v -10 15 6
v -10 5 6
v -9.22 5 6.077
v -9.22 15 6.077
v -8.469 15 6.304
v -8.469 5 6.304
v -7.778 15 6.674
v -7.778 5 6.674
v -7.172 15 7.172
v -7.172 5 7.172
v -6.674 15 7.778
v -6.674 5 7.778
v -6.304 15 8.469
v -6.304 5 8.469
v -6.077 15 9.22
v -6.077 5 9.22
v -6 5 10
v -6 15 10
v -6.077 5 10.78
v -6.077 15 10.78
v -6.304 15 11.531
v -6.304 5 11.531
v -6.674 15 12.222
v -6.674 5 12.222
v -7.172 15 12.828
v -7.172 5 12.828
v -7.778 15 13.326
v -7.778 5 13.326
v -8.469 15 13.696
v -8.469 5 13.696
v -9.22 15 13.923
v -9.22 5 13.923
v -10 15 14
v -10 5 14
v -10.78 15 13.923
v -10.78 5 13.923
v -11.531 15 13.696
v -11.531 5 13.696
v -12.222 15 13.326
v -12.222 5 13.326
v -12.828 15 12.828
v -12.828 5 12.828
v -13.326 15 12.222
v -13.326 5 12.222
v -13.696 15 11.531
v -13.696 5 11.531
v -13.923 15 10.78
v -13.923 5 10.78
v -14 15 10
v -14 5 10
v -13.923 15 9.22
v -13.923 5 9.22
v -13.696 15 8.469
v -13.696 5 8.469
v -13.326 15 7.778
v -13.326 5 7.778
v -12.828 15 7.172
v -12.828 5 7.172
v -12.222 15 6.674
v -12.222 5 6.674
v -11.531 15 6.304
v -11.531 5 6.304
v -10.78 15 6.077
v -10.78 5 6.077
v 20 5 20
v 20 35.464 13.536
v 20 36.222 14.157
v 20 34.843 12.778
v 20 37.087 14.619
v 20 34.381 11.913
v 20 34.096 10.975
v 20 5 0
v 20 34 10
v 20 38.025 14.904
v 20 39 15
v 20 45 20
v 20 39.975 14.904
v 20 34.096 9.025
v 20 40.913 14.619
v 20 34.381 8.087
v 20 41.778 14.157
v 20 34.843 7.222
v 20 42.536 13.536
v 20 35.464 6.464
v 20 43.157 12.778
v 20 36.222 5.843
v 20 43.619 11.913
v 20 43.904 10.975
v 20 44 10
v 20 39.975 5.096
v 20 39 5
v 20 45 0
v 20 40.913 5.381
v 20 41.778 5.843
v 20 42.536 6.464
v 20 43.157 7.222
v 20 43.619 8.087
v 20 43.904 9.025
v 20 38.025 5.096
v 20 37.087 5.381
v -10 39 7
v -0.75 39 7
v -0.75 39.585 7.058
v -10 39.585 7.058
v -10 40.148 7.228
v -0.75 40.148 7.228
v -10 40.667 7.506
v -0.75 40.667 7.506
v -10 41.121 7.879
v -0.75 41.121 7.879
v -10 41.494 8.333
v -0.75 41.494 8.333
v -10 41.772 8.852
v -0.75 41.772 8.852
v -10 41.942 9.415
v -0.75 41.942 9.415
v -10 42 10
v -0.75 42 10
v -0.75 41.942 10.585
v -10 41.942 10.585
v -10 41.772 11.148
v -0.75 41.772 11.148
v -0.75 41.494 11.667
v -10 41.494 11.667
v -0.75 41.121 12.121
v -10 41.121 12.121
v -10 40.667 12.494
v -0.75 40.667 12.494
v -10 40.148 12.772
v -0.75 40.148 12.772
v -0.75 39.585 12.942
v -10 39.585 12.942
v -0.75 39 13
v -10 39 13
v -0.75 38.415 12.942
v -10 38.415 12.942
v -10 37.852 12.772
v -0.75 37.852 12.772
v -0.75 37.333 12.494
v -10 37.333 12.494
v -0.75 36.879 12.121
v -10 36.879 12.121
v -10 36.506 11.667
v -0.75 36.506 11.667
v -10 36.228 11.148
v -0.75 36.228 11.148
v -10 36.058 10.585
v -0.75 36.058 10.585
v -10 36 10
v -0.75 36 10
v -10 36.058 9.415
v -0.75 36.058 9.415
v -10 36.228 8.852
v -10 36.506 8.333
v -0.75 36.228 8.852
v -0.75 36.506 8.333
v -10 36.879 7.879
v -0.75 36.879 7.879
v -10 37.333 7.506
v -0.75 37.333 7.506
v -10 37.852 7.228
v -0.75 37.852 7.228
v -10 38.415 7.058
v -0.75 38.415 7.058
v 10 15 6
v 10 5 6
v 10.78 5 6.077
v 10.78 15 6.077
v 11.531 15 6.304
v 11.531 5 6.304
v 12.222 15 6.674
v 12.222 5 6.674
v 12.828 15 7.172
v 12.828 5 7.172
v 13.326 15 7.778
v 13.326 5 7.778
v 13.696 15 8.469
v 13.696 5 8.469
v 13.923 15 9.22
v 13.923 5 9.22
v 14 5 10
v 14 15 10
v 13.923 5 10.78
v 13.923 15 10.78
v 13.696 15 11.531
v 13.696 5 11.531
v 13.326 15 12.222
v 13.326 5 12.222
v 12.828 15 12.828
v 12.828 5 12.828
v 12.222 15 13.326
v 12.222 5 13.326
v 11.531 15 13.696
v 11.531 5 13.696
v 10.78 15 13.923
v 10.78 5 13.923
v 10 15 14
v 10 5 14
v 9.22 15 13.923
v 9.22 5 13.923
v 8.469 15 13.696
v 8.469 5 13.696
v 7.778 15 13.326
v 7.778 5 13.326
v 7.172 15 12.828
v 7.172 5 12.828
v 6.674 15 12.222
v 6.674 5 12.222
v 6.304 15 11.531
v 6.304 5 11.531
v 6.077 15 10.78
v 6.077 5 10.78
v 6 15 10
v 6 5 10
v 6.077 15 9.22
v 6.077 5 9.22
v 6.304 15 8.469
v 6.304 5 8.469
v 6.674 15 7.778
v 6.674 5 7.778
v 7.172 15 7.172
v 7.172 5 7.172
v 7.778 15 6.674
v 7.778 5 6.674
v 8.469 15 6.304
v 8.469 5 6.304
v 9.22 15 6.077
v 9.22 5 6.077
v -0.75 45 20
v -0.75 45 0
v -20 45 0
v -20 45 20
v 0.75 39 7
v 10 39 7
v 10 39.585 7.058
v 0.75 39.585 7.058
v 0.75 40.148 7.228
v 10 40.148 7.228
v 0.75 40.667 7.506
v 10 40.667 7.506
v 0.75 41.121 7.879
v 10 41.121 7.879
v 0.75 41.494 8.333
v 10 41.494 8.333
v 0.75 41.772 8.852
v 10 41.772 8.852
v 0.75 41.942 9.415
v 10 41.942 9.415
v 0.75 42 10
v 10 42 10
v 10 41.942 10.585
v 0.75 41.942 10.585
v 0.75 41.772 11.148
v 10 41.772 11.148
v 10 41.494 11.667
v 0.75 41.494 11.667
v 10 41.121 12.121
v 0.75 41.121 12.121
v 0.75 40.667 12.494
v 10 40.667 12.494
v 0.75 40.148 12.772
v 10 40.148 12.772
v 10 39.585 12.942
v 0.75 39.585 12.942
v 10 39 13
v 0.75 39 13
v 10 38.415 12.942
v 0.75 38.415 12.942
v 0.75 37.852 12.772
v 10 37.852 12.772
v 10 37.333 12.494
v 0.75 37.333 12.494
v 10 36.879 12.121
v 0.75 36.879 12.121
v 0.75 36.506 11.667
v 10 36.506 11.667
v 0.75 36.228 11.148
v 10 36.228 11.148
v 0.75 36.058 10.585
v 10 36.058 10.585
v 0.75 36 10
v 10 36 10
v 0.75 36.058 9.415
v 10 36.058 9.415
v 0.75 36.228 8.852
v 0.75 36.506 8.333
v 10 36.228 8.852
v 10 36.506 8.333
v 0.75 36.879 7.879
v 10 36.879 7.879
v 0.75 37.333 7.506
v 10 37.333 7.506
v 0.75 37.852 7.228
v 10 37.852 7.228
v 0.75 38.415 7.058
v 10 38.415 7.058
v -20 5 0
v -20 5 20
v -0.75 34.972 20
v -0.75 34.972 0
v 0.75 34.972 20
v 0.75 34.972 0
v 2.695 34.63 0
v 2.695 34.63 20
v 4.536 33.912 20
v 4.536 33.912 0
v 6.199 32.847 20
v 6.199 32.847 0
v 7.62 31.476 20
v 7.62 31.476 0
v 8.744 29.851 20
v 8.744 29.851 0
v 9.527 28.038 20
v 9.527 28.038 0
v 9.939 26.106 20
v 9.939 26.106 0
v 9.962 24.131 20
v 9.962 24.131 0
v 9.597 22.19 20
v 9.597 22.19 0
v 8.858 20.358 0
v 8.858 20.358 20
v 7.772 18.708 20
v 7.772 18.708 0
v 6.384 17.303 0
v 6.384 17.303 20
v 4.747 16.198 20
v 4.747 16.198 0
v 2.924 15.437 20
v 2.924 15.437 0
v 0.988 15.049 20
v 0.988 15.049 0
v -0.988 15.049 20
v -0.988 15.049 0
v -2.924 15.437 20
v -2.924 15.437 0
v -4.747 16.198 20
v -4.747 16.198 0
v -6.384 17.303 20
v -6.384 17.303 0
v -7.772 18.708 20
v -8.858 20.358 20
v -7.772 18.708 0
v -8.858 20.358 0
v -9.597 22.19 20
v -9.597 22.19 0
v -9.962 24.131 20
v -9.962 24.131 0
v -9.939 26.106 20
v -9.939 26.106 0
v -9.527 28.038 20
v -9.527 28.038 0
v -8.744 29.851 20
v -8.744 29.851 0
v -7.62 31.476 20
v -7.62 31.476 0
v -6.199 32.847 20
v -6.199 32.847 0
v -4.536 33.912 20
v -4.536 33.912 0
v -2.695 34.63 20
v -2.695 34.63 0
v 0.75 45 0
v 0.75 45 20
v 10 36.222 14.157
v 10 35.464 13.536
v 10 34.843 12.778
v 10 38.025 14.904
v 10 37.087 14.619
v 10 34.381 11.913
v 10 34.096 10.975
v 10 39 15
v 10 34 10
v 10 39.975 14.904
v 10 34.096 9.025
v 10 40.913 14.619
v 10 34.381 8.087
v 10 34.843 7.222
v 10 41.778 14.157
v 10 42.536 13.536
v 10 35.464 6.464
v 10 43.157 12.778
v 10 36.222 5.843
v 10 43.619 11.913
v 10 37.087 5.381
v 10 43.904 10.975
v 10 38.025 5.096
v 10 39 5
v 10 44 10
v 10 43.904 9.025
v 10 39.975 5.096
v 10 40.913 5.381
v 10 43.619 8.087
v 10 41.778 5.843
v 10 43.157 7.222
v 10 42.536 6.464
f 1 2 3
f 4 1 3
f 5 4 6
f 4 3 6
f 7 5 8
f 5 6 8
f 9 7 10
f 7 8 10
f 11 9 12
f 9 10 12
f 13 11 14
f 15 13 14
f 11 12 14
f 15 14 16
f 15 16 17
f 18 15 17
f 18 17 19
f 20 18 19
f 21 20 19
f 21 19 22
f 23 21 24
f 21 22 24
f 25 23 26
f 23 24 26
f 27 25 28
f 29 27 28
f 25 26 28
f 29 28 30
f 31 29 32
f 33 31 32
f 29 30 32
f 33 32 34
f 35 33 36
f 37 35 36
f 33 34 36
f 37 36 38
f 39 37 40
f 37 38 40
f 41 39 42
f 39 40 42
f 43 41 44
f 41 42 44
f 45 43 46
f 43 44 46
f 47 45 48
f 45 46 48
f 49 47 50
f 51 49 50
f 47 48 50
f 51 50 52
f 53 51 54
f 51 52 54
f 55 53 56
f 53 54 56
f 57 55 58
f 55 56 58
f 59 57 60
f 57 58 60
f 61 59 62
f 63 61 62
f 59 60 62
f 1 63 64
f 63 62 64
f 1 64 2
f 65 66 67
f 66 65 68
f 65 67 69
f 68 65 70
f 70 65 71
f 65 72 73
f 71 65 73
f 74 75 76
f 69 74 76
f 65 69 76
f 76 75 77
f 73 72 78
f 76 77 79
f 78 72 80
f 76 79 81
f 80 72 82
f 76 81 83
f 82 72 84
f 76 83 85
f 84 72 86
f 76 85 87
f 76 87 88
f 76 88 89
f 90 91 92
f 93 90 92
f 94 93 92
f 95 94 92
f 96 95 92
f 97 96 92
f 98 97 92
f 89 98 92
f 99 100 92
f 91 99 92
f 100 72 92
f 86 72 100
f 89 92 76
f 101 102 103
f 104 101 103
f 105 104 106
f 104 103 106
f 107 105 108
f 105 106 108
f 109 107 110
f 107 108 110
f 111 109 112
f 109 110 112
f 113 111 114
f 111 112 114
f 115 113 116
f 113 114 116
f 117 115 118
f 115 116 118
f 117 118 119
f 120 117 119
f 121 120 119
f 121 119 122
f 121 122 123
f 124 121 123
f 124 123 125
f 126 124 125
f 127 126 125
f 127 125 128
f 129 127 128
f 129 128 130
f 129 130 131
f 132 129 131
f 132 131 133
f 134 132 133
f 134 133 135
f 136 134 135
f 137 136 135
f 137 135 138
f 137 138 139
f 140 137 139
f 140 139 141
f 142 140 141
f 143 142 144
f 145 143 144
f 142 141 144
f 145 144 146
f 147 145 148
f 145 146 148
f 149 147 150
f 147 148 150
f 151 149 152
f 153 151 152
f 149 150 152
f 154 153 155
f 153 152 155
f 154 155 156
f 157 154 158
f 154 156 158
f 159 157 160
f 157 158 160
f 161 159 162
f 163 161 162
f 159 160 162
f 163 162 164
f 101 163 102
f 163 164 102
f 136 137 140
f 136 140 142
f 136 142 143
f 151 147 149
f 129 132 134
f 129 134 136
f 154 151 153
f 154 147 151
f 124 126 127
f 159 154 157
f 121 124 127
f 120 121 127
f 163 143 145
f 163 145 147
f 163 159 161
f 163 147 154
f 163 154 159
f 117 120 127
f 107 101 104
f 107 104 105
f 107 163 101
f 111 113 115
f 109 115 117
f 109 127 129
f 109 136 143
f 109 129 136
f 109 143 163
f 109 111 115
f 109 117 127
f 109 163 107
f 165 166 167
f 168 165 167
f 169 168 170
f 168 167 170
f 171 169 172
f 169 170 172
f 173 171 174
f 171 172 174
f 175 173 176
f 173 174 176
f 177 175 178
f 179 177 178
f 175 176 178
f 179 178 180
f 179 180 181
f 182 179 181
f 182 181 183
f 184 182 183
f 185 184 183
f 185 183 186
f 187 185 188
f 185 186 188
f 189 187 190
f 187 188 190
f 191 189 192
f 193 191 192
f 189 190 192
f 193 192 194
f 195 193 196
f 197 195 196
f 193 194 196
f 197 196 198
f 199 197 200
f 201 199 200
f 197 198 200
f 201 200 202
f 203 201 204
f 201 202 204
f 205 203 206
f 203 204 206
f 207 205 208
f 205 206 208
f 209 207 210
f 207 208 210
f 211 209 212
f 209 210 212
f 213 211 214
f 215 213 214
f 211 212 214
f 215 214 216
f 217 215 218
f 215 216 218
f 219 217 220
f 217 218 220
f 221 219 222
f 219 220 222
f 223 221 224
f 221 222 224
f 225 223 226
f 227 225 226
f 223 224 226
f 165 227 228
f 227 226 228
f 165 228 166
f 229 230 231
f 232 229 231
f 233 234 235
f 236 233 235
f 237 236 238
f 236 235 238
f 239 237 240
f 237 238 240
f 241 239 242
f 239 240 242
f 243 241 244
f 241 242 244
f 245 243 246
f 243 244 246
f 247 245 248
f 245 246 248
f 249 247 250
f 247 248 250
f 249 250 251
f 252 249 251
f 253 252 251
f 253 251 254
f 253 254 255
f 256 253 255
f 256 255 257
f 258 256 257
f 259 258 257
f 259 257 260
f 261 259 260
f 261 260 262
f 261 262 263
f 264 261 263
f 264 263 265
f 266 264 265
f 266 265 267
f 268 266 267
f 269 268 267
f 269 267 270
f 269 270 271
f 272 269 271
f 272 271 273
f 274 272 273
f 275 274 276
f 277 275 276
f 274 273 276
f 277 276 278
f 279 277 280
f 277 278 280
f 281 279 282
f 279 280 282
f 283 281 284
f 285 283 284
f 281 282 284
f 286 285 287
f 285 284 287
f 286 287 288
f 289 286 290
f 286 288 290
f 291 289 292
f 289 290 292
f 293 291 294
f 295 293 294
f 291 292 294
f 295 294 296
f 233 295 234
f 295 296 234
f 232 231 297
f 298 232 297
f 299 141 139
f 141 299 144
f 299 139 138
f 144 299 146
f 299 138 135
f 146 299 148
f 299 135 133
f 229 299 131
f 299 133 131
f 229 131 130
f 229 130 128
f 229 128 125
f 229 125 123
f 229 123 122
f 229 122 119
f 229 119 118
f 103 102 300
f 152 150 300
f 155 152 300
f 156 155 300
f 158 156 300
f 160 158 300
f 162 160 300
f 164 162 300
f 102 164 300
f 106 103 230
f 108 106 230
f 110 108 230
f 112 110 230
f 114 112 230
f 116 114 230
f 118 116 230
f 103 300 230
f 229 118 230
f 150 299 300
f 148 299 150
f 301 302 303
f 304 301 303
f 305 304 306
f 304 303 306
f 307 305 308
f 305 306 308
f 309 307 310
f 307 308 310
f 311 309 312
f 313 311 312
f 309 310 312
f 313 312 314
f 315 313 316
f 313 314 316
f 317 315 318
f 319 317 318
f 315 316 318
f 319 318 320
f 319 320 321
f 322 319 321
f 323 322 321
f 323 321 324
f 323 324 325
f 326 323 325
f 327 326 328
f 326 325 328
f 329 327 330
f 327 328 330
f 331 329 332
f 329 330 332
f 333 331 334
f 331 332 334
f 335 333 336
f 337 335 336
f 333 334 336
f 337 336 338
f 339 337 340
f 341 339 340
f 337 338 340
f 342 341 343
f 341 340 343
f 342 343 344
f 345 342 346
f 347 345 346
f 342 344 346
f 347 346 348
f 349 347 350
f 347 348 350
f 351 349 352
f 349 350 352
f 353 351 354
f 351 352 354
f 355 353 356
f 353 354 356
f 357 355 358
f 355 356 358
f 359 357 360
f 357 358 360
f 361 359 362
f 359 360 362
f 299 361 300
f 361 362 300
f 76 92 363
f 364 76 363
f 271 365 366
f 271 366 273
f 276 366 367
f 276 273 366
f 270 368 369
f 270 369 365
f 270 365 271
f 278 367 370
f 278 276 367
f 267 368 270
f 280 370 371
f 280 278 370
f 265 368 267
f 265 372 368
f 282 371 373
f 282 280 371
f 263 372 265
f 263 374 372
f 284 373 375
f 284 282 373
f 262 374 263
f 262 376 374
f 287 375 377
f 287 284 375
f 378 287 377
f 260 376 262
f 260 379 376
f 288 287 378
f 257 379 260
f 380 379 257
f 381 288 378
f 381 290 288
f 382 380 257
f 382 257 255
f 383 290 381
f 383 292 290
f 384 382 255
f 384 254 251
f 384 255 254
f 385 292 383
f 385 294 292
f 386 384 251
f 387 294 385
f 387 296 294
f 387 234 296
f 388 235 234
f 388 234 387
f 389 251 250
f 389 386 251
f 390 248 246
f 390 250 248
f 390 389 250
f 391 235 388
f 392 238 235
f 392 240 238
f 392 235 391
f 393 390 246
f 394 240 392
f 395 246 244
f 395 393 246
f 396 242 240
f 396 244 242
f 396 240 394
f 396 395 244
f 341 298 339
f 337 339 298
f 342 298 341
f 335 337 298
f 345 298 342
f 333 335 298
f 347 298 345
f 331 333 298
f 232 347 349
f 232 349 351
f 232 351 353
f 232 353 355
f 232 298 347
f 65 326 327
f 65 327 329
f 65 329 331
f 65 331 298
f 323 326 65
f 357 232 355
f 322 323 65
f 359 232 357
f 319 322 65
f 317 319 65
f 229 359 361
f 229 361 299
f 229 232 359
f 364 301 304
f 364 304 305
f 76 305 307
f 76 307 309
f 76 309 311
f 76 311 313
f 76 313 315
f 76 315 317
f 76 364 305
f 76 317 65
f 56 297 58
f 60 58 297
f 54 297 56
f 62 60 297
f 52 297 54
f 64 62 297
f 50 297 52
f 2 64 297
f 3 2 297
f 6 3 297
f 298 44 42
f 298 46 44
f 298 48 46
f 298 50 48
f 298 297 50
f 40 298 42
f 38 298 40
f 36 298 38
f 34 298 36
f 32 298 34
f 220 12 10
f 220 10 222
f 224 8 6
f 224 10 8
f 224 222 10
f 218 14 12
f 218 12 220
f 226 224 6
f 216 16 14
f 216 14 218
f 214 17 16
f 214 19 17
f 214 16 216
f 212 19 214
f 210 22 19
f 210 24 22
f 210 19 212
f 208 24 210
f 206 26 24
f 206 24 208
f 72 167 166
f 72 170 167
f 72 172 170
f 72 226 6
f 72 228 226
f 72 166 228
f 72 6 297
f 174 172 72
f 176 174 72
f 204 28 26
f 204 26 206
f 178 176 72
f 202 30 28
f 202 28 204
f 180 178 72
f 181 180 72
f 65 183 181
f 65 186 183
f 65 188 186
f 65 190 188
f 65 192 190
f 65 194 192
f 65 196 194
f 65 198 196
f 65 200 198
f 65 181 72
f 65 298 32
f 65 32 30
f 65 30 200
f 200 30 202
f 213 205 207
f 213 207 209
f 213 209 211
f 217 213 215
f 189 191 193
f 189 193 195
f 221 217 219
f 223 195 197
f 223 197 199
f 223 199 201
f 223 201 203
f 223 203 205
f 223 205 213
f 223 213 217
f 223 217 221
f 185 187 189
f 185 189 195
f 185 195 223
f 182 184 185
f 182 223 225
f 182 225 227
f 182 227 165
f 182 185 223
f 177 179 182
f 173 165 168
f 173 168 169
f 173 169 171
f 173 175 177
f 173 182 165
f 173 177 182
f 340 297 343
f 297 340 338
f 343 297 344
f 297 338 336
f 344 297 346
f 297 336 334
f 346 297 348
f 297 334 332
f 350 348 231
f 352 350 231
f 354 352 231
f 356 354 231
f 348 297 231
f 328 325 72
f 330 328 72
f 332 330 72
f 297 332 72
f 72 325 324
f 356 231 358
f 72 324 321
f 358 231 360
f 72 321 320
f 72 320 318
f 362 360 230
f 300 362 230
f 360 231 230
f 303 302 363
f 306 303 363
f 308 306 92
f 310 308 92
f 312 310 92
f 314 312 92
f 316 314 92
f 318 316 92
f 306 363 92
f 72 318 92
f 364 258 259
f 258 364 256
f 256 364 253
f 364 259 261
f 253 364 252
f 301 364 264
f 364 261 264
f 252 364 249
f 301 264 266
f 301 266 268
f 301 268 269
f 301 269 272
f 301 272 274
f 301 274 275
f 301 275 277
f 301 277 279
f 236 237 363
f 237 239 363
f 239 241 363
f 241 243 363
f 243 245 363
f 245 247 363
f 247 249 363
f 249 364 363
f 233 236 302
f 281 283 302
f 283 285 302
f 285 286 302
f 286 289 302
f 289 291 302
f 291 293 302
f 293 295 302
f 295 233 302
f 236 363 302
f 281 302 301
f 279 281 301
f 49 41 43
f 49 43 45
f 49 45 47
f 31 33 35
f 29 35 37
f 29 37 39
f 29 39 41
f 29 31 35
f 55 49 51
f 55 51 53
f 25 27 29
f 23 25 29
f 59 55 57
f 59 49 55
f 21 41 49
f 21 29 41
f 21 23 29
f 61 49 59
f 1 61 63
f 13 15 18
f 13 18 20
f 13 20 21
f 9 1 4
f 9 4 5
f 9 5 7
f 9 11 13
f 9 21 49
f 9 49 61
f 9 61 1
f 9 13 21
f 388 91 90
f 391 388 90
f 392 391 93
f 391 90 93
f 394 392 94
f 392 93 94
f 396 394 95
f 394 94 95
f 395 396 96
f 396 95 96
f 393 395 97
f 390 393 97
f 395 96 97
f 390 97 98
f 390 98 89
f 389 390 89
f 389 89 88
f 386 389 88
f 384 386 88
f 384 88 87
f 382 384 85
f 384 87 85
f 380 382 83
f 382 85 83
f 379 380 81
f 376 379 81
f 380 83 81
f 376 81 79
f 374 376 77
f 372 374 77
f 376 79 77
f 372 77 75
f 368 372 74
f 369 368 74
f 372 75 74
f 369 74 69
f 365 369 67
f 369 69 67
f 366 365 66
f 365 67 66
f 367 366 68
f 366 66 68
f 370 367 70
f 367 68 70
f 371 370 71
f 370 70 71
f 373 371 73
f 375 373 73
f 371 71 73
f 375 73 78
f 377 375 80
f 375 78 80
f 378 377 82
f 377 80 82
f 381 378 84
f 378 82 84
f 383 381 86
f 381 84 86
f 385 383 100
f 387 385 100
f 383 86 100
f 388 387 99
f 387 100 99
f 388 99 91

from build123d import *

# Parameters (mm, degrees)
CROQUIS1_R              = 3
SALIENTE_EXTRUIR1_DEPTH = 20
CROQUIS2_R              = 3
CORTAR_EXTRUIR1_DEPTH   = 30
CROQUIS3_R              = 5
CORTAR_EXTRUIR2_DEPTH   = 10
CROQUIS4_W              = 40
CROQUIS4_H              = 50
CORTAR_EXTRUIR3_DEPTH   = 54.150729064
CROQUIS5_R              = 4
CORTAR_EXTRUIR4_DEPTH   = 10


with BuildPart() as part:
    # Croquis1 → Saliente-Extruir1 (new body)
    with BuildSketch(Plane.XY):
        with BuildLine():
            Line((-0.75, 34.971835338), (-0.75, 45))
            Line((-0.75, 45), (-20, 45))
            Line((-20, 45), (-20, -45))
            Line((-20, -45), (20, -45))
            Line((20, -45), (20, 45))
            Line((20, 45), (0.75, 45))
            Line((0.75, 45), (0.75, 34.971835338))
            ThreePointArc((0.75, 34.971835338), (0, 15), (-0.75, 34.971835338))
        make_face()
        with Locations((-10, -35)):
            Circle(CROQUIS1_R, mode=Mode.SUBTRACT)
        with Locations((10, -35)):
            Circle(CROQUIS1_R, mode=Mode.SUBTRACT)
    extrude(amount=SALIENTE_EXTRUIR1_DEPTH)

    # Croquis2 → Cortar-Extruir1 (cut)
    with BuildSketch(Plane(origin=(20, 0, 0), x_dir=(0, 0, -1), z_dir=(1, 0, 0))):
        with Locations((-10, 39)):
            Circle(CROQUIS2_R)
    extrude(amount=-CORTAR_EXTRUIR1_DEPTH, mode=Mode.SUBTRACT)

    # Croquis3 → Cortar-Extruir2 (cut)
    with BuildSketch(Plane(origin=(20, 0, 0), x_dir=(0, 0, -1), z_dir=(1, 0, 0))):
        with Locations((-10, 39)):
            Circle(CROQUIS3_R)
    extrude(amount=-CORTAR_EXTRUIR2_DEPTH, mode=Mode.SUBTRACT)

    # Croquis4 → Cortar-Extruir3 (cut, through all)
    with BuildSketch(Plane.XY.offset(20)):
        with Locations((0, -20)):
            Rectangle(CROQUIS4_W, CROQUIS4_H)
    extrude(amount=-CORTAR_EXTRUIR3_DEPTH, mode=Mode.SUBTRACT)

    # Croquis5 → Cortar-Extruir4 (cut)
    with BuildSketch(Plane.XZ.offset(-5)):
        with Locations(Location((-10, 10, 0), (0, 0, 270))):
            Circle(CROQUIS5_R)
        with Locations(Location((10, 10, 0), (0, 0, 270))):
            Circle(CROQUIS5_R)
    extrude(amount=-CORTAR_EXTRUIR4_DEPTH, mode=Mode.SUBTRACT)


solid = part.part
